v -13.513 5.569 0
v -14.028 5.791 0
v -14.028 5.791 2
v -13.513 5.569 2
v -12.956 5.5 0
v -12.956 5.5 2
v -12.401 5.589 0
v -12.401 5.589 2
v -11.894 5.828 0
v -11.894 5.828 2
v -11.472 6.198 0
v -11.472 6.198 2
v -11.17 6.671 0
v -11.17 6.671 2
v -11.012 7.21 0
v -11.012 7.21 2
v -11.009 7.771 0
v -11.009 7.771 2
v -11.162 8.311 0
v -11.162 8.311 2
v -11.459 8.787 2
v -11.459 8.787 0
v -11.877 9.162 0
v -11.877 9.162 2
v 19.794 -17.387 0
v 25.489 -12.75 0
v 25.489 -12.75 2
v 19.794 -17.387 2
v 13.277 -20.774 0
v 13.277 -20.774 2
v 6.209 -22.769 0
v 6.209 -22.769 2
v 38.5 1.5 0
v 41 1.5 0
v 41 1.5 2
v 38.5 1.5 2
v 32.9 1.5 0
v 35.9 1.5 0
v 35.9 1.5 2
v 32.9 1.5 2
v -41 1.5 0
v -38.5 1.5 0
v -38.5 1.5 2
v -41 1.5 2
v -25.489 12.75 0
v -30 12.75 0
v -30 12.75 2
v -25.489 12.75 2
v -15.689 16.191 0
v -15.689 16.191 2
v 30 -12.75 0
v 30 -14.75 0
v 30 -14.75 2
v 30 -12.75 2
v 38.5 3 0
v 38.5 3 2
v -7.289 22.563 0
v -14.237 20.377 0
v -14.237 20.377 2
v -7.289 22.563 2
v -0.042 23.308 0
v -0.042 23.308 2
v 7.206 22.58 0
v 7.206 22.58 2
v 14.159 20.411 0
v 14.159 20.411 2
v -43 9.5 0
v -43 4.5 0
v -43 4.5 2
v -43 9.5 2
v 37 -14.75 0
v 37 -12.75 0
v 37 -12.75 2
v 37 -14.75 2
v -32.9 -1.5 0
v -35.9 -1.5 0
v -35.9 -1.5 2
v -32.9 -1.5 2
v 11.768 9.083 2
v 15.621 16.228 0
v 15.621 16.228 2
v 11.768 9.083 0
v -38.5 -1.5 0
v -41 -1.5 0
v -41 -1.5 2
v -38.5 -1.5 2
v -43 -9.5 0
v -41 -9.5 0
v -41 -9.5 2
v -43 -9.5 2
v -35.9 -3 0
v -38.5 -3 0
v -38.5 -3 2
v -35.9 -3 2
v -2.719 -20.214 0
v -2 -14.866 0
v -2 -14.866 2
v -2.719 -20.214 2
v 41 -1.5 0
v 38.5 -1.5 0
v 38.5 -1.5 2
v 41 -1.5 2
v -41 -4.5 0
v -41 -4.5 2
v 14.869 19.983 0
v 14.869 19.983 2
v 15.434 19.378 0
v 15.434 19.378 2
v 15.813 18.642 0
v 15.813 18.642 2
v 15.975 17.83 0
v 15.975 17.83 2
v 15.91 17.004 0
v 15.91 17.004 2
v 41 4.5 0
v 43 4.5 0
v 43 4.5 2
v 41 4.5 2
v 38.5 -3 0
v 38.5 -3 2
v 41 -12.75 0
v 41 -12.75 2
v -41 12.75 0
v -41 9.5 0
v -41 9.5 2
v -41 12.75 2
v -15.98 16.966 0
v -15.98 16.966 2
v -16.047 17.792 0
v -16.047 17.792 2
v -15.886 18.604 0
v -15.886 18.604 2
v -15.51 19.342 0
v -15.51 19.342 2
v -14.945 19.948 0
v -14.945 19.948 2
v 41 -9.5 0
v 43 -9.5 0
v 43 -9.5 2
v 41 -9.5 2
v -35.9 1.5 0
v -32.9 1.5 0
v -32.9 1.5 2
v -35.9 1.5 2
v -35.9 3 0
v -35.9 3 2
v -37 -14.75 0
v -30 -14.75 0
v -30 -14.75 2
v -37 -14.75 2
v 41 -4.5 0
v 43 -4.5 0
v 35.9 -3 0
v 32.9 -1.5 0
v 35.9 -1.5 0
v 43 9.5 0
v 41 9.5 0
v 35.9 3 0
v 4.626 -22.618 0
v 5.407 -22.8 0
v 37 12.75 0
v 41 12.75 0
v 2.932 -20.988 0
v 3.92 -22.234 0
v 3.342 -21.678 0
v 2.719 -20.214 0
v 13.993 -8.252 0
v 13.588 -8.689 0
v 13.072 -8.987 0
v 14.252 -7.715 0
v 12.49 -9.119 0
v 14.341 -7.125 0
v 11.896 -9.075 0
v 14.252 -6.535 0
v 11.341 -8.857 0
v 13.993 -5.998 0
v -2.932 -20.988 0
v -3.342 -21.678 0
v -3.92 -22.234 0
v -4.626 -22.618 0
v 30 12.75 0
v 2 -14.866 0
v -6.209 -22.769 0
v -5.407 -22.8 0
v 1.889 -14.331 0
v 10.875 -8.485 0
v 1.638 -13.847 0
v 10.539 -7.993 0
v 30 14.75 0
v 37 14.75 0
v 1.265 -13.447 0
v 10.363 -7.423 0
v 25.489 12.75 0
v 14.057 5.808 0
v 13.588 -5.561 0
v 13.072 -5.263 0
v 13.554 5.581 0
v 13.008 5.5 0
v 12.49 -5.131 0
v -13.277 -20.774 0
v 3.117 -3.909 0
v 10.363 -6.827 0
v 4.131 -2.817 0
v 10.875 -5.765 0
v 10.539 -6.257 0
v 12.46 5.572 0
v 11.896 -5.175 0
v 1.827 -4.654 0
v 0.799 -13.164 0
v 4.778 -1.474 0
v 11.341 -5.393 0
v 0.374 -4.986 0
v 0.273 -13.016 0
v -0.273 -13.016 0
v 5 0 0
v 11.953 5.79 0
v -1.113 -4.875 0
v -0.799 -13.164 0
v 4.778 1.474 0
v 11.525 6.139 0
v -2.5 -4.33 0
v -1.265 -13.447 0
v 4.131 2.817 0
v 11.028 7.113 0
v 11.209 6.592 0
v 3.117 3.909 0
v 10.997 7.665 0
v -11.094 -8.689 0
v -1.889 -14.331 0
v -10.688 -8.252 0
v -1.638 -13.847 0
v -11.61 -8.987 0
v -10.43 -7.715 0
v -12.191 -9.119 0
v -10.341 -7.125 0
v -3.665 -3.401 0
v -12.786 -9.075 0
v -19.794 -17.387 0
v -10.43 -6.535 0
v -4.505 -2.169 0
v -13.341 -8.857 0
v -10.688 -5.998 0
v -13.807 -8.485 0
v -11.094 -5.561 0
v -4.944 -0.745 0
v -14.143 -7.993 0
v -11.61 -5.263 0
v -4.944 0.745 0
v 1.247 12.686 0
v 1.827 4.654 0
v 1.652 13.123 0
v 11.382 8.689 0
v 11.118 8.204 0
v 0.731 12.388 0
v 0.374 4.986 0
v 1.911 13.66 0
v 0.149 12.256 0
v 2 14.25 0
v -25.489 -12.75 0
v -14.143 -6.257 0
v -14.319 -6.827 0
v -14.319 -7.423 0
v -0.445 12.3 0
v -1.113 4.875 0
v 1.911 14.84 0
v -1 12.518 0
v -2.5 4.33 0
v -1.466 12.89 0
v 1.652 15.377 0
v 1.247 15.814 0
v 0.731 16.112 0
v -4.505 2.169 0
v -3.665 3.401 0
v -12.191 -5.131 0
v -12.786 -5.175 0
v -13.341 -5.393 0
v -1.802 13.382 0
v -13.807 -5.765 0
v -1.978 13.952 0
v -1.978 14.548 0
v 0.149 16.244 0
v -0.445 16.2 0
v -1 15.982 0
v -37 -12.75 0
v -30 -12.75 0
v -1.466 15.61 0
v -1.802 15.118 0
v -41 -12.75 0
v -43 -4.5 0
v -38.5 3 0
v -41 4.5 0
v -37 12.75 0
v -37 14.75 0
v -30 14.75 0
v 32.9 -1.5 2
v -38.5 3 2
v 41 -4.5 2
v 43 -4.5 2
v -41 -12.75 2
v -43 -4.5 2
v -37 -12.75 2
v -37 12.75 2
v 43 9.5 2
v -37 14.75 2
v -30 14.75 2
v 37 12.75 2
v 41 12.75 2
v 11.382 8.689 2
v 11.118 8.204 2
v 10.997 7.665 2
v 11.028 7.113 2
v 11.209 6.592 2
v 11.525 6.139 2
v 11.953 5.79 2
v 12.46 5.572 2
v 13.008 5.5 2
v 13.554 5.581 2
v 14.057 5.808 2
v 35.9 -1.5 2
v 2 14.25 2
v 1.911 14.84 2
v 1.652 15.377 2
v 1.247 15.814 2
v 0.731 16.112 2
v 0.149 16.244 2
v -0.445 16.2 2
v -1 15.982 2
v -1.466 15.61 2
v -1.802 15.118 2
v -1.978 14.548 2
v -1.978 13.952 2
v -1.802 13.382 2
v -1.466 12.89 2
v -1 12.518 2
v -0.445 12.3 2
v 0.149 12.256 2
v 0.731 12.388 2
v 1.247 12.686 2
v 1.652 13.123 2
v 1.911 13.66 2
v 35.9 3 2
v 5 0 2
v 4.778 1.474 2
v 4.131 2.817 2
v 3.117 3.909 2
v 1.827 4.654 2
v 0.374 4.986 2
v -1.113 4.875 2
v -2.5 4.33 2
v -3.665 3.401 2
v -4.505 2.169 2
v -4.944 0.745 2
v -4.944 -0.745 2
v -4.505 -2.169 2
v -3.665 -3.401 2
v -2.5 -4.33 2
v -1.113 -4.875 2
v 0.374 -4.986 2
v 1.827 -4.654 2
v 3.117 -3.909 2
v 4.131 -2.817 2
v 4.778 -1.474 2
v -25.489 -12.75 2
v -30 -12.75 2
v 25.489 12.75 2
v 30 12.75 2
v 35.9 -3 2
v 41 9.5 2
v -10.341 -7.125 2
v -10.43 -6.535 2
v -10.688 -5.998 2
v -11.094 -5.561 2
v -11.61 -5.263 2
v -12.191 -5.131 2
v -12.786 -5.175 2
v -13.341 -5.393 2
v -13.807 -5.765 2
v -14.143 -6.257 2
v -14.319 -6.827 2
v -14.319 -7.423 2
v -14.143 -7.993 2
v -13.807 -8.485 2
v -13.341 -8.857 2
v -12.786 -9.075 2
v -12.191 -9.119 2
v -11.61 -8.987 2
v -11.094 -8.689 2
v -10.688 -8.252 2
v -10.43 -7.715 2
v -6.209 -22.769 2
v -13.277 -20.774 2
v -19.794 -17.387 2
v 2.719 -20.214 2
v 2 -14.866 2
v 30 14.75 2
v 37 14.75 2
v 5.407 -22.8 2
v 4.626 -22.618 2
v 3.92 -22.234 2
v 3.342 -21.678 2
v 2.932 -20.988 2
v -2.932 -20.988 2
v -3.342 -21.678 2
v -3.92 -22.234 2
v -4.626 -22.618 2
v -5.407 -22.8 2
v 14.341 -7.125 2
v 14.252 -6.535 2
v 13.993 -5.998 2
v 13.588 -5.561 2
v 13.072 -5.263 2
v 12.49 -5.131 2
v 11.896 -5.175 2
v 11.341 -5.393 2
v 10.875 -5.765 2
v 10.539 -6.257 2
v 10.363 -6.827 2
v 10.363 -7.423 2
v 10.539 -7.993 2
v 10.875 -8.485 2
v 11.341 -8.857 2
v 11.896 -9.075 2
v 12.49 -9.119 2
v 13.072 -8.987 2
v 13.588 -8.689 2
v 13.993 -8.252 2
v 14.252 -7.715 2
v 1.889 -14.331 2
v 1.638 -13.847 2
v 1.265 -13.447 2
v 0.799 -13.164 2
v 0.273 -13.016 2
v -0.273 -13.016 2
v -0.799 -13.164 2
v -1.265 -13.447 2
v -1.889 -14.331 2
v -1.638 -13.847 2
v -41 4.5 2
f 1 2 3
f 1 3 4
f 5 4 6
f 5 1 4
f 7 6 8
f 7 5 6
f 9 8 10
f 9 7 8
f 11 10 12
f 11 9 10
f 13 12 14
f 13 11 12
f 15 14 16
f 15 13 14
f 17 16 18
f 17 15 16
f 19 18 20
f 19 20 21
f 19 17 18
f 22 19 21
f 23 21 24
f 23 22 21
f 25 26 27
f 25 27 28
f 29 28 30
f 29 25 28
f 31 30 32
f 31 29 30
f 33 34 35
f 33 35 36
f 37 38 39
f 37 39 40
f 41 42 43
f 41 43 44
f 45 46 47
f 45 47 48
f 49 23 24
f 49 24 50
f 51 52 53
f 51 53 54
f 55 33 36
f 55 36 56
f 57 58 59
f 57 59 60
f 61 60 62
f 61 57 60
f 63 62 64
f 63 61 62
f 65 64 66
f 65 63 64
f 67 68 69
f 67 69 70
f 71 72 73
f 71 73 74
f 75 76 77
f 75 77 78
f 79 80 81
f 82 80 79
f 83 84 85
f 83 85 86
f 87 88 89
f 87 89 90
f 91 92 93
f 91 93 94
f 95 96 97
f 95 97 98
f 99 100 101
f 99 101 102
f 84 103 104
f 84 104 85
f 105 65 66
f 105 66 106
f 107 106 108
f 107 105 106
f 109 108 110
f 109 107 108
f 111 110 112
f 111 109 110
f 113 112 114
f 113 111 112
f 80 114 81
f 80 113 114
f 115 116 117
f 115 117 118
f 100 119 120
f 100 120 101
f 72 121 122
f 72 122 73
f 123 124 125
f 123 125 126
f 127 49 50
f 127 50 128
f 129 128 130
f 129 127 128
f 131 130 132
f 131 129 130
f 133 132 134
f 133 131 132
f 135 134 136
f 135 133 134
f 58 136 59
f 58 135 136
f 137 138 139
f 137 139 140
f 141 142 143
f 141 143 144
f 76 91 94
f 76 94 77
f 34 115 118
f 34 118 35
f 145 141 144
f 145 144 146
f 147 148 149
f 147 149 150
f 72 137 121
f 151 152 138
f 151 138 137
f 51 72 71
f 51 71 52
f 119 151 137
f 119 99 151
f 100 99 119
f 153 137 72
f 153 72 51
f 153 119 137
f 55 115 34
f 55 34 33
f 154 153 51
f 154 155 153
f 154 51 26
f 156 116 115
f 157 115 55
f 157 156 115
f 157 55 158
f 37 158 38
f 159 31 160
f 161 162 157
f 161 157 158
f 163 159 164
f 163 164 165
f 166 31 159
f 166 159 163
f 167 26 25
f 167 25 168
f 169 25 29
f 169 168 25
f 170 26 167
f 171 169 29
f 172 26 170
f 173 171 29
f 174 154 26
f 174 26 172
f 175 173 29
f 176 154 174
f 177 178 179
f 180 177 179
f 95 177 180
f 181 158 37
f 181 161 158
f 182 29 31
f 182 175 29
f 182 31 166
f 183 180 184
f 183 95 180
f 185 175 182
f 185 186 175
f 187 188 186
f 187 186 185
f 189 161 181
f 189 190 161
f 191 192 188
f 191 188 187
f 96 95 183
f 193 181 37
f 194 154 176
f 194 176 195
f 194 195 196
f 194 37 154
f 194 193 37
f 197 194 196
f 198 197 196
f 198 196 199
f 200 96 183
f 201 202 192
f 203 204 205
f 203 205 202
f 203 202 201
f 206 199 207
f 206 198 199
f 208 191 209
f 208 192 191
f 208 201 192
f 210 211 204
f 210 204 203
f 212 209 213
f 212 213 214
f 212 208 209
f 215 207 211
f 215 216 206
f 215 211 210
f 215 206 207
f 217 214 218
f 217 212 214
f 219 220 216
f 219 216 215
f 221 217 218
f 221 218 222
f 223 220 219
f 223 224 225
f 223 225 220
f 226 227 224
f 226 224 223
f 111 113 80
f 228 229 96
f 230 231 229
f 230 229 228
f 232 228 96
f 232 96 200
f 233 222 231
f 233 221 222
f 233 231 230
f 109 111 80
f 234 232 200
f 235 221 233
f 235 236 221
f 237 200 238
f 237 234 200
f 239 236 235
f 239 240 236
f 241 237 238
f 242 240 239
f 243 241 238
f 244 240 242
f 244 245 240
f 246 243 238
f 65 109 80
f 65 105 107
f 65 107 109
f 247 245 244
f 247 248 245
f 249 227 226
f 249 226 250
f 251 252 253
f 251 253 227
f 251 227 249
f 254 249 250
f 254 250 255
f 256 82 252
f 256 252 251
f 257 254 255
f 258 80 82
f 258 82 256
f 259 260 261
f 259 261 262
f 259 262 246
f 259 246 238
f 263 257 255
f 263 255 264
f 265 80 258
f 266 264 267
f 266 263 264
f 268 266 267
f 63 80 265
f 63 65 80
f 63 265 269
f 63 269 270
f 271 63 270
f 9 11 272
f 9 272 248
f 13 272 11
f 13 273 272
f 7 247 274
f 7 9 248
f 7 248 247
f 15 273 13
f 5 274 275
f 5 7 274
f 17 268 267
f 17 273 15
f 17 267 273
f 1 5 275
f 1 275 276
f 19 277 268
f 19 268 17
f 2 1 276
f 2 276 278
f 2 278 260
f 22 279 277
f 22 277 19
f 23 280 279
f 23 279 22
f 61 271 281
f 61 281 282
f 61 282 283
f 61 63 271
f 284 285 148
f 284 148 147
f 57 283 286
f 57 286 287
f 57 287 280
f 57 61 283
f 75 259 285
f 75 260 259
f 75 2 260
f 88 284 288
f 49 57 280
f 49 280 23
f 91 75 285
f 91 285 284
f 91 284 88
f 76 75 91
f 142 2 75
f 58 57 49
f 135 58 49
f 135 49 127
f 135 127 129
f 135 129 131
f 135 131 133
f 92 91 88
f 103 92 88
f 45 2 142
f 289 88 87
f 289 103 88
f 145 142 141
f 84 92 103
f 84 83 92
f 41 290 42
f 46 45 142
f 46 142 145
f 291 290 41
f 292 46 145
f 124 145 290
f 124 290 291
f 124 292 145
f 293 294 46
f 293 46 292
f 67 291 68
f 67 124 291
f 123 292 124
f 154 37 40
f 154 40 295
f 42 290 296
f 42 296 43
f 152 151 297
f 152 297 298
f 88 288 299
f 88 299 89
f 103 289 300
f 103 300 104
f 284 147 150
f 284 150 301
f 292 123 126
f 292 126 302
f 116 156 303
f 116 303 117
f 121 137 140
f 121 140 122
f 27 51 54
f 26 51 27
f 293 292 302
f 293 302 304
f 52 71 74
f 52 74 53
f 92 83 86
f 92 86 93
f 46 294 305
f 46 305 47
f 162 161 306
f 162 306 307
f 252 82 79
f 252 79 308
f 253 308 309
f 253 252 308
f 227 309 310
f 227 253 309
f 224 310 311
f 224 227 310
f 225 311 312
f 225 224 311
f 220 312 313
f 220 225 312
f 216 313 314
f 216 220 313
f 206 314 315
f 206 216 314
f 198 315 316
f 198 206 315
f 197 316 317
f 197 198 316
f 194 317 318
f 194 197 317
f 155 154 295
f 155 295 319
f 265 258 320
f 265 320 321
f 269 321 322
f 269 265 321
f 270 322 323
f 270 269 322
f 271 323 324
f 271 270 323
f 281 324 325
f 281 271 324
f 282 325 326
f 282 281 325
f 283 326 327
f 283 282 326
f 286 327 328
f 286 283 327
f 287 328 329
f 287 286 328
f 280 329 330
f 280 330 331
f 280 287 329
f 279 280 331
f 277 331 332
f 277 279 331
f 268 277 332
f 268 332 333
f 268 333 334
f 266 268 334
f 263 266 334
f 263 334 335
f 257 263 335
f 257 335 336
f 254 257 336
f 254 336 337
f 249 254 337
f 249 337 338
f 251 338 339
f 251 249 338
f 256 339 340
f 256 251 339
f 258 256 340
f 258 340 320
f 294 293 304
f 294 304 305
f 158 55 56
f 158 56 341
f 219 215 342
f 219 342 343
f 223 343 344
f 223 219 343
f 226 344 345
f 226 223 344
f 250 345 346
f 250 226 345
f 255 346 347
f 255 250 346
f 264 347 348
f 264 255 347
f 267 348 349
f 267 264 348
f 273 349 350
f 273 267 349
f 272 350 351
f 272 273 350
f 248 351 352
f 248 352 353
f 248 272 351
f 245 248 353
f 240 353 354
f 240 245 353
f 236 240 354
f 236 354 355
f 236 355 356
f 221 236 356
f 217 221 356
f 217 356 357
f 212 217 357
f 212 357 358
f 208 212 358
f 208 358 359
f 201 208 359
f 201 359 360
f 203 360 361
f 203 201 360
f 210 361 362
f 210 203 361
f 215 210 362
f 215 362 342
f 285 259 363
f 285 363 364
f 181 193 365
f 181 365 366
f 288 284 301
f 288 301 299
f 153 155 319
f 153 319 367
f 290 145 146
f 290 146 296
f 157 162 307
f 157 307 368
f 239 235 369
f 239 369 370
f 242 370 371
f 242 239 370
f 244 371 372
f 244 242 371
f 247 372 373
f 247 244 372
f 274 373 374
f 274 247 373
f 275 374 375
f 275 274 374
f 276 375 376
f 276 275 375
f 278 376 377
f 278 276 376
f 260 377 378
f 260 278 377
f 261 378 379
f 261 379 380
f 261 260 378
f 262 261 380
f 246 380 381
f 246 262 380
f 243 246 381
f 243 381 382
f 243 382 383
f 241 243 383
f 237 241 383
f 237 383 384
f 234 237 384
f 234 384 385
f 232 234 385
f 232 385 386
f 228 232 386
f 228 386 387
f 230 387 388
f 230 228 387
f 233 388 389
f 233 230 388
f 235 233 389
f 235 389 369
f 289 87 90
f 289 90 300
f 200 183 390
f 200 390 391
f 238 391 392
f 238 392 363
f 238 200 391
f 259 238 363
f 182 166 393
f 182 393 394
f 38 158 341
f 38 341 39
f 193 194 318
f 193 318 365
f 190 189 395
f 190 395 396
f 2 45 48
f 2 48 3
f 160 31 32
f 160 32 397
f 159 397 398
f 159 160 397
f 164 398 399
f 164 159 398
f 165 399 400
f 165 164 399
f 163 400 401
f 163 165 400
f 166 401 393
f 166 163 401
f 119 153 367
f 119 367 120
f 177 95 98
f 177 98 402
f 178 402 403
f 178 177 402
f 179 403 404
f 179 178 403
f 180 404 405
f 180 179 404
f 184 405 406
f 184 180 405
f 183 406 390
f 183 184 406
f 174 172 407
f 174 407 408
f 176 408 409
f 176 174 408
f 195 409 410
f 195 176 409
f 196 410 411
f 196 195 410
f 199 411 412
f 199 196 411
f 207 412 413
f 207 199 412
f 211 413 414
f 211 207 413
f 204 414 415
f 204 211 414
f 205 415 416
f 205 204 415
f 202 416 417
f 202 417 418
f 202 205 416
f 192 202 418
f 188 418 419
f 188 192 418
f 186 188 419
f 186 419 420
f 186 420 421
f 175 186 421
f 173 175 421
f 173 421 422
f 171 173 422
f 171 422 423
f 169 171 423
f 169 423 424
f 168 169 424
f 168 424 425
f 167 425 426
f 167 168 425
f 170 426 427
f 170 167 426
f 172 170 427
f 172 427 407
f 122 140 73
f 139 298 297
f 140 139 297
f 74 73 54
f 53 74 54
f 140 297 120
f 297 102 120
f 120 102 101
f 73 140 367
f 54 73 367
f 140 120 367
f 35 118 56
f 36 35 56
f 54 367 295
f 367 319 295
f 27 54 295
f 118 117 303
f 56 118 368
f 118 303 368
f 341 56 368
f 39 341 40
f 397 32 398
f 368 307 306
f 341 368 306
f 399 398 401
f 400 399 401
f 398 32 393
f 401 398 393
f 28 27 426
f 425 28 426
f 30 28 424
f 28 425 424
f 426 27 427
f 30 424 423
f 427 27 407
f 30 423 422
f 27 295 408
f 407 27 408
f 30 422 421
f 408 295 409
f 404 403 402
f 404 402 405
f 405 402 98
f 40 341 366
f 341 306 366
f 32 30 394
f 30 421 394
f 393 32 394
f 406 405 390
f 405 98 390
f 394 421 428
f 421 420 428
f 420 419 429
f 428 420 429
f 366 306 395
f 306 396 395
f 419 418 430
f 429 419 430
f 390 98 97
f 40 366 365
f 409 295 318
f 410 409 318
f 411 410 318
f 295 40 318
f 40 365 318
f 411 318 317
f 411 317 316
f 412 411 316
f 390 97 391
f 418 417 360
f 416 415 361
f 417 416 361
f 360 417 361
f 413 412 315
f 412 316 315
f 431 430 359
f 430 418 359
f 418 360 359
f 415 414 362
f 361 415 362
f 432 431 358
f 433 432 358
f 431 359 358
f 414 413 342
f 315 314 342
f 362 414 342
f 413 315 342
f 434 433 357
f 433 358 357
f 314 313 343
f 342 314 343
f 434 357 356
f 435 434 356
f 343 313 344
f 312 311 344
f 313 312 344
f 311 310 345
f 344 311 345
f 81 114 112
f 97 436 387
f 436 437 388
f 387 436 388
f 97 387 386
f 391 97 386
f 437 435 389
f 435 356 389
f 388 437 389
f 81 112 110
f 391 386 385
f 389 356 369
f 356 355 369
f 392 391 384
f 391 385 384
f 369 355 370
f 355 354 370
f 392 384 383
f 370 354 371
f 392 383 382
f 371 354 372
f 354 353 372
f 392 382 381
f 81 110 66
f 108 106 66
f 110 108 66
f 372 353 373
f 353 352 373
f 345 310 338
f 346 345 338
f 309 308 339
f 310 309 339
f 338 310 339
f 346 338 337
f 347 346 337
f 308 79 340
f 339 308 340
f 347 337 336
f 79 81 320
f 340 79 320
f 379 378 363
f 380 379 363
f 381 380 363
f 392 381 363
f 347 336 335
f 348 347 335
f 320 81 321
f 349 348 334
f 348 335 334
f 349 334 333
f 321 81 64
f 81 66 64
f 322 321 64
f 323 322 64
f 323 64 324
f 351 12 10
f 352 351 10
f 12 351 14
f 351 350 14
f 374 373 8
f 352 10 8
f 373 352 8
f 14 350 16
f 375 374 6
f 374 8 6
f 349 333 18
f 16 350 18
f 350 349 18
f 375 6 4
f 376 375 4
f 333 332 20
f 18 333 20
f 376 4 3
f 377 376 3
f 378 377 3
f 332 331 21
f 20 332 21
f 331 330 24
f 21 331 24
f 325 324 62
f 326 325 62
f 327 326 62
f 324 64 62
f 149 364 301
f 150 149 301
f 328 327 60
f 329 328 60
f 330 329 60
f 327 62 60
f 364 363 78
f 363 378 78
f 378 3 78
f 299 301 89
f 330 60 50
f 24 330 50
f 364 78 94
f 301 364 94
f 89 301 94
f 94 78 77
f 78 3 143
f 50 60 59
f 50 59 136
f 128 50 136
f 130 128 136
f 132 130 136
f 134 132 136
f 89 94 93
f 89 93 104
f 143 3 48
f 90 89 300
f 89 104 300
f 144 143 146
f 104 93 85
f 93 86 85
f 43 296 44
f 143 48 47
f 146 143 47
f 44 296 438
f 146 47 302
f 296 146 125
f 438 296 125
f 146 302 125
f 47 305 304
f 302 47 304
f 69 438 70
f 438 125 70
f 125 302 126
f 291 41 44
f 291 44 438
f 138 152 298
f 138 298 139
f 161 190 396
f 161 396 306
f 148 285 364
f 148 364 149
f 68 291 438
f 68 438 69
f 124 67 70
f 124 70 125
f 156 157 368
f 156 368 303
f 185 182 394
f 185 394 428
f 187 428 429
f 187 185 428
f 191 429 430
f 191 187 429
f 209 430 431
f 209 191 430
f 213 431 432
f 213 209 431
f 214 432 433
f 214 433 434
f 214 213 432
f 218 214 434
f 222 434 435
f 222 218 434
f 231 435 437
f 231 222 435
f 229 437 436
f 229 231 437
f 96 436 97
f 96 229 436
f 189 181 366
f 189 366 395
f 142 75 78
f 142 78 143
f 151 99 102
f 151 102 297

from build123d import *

# Parameters (mm, degrees)
SKETCH_1_R      = 2
SKETCH_1_R_2    = 5
EXTRUDE_2_DEPTH = 2


with BuildPart() as part:
    # 草图1 → 凸台-拉伸2 (new body)
    with BuildSketch(Plane.XY):
        with BuildLine():
            Line((-37, -12.75), (-41, -12.75))
            Line((-41, -12.75), (-41, -9.5))
            Line((-41, -9.5), (-43, -9.5))
            Line((-43, -9.5), (-43, -4.5))
            Line((-43, -4.5), (-41, -4.5))
            Line((-41, -4.5), (-41, -1.5))
            Line((-41, -1.5), (-38.5, -1.5))
            Line((-38.5, -1.5), (-38.5, -3))
            Line((-38.5, -3), (-35.9, -3))
            Line((-35.9, -3), (-35.9, -1.5))
            Line((-35.9, -1.5), (-32.9, -1.5))
            Line((-32.9, -1.5), (-32.9, 1.5))
            Line((-32.9, 1.5), (-35.9, 1.5))
            Line((-35.9, 1.5), (-35.9, 3))
            Line((-35.9, 3), (-38.5, 3))
            Line((-38.5, 3), (-38.5, 1.5))
            Line((-38.5, 1.5), (-41, 1.5))
            Line((-41, 1.5), (-41, 4.5))
            Line((-41, 4.5), (-43, 4.5))
            Line((-43, 4.5), (-43, 9.5))
            Line((-43, 9.5), (-41, 9.5))
            Line((-41, 9.5), (-41, 12.75))
            Line((-41, 12.75), (-37, 12.75))
            Line((-37, 12.75), (-37, 14.75))
            Line((-37, 14.75), (-30, 14.75))
            Line((-30, 14.75), (-30, 12.75))
            Line((-30, 12.75), (-25.488968202, 12.75))
            Line((-25.488968202, 12.75), (-14.028482804, 5.790513304))
            ThreePointArc((-14.028482804, 5.790513304), (-11.304453577, 6.424059234), (-11.8771357, 9.161530853))
            Line((-11.8771357, 9.161530853), (-15.689334886, 16.190924706))
            ThreePointArc((-15.689334886, 16.190924706), (-15.886477166, 18.604361531), (-14.237063941, 20.37720625))
            ThreePointArc((-14.237063941, 20.37720625), (-0.042376251, 23.307851412), (14.159162664, 20.410588547))
            ThreePointArc((14.159162664, 20.410588547), (15.812739599, 18.641626787), (15.621272277, 16.227733118))
            Line((15.621272277, 16.227733118), (11.768369699, 9.083252425))
            ThreePointArc((11.768369699, 9.083252425), (11.351042044, 6.354326573), (14.057146467, 5.808251922))
            Line((14.057146467, 5.808251922), (25.488968202, 12.75))
            Line((25.488968202, 12.75), (30, 12.75))
            Line((30, 12.75), (30, 14.75))
            Line((30, 14.75), (37, 14.75))
            Line((37, 14.75), (37, 12.75))
            Line((37, 12.75), (41, 12.75))
            Line((41, 12.75), (41, 9.5))
            Line((41, 9.5), (43, 9.5))
            Line((43, 9.5), (43, 4.5))
            Line((43, 4.5), (41, 4.5))
            Line((41, 4.5), (41, 1.5))
            Line((41, 1.5), (38.5, 1.5))
            Line((38.5, 1.5), (38.5, 3))
            Line((38.5, 3), (35.9, 3))
            Line((35.9, 3), (35.9, 1.5))
            Line((35.9, 1.5), (32.9, 1.5))
            Line((32.9, 1.5), (32.9, -1.5))
            Line((32.9, -1.5), (35.9, -1.5))
            Line((35.9, -1.5), (35.9, -3))
            Line((35.9, -3), (38.5, -3))
            Line((38.5, -3), (38.5, -1.5))
            Line((38.5, -1.5), (41, -1.5))
            Line((41, -1.5), (41, -4.5))
            Line((41, -4.5), (43, -4.5))
            Line((43, -4.5), (43, -9.5))
            Line((43, -9.5), (41, -9.5))
            Line((41, -9.5), (41, -12.75))
            Line((41, -12.75), (37, -12.75))
            Line((37, -12.75), (37, -14.75))
            Line((37, -14.75), (30, -14.75))
            Line((30, -14.75), (30, -12.75))
            Line((30, -12.75), (25.488968202, -12.75))
            ThreePointArc((25.488968202, -12.75), (16.622058042, -19.246687746), (6.209460579, -22.769025255))
            ThreePointArc((6.209460579, -22.769025255), (3.920471276, -22.23446682), (2.719464237, -20.213871155))
            Line((2.719464237, -20.213871155), (2, -14.866068747))
            ThreePointArc((2, -14.866068747), (0, -12.997534789), (-2, -14.866068747))
            Line((-2, -14.866068747), (-2.719464237, -20.213871155))
            ThreePointArc((-2.719464237, -20.213871155), (-3.920471276, -22.23446682), (-6.209460579, -22.769025255))
            ThreePointArc((-6.209460579, -22.769025255), (-16.622058042, -19.246687746), (-25.488968202, -12.75))
            Line((-25.488968202, -12.75), (-30, -12.75))
            Line((-30, -12.75), (-30, -14.75))
            Line((-30, -14.75), (-37, -14.75))
            Line((-37, -14.75), (-37, -12.75))
        make_face()
        with Locations((0, 14.25)):
            Circle(SKETCH_1_R, mode=Mode.SUBTRACT)
        with Locations((12.340862004, -7.125)):
            Circle(SKETCH_1_R, mode=Mode.SUBTRACT)
        with Locations((-12.340862004, -7.125)):
            Circle(SKETCH_1_R, mode=Mode.SUBTRACT)
        Circle(SKETCH_1_R_2, mode=Mode.SUBTRACT)
    extrude(amount=EXTRUDE_2_DEPTH)


solid = part.part
